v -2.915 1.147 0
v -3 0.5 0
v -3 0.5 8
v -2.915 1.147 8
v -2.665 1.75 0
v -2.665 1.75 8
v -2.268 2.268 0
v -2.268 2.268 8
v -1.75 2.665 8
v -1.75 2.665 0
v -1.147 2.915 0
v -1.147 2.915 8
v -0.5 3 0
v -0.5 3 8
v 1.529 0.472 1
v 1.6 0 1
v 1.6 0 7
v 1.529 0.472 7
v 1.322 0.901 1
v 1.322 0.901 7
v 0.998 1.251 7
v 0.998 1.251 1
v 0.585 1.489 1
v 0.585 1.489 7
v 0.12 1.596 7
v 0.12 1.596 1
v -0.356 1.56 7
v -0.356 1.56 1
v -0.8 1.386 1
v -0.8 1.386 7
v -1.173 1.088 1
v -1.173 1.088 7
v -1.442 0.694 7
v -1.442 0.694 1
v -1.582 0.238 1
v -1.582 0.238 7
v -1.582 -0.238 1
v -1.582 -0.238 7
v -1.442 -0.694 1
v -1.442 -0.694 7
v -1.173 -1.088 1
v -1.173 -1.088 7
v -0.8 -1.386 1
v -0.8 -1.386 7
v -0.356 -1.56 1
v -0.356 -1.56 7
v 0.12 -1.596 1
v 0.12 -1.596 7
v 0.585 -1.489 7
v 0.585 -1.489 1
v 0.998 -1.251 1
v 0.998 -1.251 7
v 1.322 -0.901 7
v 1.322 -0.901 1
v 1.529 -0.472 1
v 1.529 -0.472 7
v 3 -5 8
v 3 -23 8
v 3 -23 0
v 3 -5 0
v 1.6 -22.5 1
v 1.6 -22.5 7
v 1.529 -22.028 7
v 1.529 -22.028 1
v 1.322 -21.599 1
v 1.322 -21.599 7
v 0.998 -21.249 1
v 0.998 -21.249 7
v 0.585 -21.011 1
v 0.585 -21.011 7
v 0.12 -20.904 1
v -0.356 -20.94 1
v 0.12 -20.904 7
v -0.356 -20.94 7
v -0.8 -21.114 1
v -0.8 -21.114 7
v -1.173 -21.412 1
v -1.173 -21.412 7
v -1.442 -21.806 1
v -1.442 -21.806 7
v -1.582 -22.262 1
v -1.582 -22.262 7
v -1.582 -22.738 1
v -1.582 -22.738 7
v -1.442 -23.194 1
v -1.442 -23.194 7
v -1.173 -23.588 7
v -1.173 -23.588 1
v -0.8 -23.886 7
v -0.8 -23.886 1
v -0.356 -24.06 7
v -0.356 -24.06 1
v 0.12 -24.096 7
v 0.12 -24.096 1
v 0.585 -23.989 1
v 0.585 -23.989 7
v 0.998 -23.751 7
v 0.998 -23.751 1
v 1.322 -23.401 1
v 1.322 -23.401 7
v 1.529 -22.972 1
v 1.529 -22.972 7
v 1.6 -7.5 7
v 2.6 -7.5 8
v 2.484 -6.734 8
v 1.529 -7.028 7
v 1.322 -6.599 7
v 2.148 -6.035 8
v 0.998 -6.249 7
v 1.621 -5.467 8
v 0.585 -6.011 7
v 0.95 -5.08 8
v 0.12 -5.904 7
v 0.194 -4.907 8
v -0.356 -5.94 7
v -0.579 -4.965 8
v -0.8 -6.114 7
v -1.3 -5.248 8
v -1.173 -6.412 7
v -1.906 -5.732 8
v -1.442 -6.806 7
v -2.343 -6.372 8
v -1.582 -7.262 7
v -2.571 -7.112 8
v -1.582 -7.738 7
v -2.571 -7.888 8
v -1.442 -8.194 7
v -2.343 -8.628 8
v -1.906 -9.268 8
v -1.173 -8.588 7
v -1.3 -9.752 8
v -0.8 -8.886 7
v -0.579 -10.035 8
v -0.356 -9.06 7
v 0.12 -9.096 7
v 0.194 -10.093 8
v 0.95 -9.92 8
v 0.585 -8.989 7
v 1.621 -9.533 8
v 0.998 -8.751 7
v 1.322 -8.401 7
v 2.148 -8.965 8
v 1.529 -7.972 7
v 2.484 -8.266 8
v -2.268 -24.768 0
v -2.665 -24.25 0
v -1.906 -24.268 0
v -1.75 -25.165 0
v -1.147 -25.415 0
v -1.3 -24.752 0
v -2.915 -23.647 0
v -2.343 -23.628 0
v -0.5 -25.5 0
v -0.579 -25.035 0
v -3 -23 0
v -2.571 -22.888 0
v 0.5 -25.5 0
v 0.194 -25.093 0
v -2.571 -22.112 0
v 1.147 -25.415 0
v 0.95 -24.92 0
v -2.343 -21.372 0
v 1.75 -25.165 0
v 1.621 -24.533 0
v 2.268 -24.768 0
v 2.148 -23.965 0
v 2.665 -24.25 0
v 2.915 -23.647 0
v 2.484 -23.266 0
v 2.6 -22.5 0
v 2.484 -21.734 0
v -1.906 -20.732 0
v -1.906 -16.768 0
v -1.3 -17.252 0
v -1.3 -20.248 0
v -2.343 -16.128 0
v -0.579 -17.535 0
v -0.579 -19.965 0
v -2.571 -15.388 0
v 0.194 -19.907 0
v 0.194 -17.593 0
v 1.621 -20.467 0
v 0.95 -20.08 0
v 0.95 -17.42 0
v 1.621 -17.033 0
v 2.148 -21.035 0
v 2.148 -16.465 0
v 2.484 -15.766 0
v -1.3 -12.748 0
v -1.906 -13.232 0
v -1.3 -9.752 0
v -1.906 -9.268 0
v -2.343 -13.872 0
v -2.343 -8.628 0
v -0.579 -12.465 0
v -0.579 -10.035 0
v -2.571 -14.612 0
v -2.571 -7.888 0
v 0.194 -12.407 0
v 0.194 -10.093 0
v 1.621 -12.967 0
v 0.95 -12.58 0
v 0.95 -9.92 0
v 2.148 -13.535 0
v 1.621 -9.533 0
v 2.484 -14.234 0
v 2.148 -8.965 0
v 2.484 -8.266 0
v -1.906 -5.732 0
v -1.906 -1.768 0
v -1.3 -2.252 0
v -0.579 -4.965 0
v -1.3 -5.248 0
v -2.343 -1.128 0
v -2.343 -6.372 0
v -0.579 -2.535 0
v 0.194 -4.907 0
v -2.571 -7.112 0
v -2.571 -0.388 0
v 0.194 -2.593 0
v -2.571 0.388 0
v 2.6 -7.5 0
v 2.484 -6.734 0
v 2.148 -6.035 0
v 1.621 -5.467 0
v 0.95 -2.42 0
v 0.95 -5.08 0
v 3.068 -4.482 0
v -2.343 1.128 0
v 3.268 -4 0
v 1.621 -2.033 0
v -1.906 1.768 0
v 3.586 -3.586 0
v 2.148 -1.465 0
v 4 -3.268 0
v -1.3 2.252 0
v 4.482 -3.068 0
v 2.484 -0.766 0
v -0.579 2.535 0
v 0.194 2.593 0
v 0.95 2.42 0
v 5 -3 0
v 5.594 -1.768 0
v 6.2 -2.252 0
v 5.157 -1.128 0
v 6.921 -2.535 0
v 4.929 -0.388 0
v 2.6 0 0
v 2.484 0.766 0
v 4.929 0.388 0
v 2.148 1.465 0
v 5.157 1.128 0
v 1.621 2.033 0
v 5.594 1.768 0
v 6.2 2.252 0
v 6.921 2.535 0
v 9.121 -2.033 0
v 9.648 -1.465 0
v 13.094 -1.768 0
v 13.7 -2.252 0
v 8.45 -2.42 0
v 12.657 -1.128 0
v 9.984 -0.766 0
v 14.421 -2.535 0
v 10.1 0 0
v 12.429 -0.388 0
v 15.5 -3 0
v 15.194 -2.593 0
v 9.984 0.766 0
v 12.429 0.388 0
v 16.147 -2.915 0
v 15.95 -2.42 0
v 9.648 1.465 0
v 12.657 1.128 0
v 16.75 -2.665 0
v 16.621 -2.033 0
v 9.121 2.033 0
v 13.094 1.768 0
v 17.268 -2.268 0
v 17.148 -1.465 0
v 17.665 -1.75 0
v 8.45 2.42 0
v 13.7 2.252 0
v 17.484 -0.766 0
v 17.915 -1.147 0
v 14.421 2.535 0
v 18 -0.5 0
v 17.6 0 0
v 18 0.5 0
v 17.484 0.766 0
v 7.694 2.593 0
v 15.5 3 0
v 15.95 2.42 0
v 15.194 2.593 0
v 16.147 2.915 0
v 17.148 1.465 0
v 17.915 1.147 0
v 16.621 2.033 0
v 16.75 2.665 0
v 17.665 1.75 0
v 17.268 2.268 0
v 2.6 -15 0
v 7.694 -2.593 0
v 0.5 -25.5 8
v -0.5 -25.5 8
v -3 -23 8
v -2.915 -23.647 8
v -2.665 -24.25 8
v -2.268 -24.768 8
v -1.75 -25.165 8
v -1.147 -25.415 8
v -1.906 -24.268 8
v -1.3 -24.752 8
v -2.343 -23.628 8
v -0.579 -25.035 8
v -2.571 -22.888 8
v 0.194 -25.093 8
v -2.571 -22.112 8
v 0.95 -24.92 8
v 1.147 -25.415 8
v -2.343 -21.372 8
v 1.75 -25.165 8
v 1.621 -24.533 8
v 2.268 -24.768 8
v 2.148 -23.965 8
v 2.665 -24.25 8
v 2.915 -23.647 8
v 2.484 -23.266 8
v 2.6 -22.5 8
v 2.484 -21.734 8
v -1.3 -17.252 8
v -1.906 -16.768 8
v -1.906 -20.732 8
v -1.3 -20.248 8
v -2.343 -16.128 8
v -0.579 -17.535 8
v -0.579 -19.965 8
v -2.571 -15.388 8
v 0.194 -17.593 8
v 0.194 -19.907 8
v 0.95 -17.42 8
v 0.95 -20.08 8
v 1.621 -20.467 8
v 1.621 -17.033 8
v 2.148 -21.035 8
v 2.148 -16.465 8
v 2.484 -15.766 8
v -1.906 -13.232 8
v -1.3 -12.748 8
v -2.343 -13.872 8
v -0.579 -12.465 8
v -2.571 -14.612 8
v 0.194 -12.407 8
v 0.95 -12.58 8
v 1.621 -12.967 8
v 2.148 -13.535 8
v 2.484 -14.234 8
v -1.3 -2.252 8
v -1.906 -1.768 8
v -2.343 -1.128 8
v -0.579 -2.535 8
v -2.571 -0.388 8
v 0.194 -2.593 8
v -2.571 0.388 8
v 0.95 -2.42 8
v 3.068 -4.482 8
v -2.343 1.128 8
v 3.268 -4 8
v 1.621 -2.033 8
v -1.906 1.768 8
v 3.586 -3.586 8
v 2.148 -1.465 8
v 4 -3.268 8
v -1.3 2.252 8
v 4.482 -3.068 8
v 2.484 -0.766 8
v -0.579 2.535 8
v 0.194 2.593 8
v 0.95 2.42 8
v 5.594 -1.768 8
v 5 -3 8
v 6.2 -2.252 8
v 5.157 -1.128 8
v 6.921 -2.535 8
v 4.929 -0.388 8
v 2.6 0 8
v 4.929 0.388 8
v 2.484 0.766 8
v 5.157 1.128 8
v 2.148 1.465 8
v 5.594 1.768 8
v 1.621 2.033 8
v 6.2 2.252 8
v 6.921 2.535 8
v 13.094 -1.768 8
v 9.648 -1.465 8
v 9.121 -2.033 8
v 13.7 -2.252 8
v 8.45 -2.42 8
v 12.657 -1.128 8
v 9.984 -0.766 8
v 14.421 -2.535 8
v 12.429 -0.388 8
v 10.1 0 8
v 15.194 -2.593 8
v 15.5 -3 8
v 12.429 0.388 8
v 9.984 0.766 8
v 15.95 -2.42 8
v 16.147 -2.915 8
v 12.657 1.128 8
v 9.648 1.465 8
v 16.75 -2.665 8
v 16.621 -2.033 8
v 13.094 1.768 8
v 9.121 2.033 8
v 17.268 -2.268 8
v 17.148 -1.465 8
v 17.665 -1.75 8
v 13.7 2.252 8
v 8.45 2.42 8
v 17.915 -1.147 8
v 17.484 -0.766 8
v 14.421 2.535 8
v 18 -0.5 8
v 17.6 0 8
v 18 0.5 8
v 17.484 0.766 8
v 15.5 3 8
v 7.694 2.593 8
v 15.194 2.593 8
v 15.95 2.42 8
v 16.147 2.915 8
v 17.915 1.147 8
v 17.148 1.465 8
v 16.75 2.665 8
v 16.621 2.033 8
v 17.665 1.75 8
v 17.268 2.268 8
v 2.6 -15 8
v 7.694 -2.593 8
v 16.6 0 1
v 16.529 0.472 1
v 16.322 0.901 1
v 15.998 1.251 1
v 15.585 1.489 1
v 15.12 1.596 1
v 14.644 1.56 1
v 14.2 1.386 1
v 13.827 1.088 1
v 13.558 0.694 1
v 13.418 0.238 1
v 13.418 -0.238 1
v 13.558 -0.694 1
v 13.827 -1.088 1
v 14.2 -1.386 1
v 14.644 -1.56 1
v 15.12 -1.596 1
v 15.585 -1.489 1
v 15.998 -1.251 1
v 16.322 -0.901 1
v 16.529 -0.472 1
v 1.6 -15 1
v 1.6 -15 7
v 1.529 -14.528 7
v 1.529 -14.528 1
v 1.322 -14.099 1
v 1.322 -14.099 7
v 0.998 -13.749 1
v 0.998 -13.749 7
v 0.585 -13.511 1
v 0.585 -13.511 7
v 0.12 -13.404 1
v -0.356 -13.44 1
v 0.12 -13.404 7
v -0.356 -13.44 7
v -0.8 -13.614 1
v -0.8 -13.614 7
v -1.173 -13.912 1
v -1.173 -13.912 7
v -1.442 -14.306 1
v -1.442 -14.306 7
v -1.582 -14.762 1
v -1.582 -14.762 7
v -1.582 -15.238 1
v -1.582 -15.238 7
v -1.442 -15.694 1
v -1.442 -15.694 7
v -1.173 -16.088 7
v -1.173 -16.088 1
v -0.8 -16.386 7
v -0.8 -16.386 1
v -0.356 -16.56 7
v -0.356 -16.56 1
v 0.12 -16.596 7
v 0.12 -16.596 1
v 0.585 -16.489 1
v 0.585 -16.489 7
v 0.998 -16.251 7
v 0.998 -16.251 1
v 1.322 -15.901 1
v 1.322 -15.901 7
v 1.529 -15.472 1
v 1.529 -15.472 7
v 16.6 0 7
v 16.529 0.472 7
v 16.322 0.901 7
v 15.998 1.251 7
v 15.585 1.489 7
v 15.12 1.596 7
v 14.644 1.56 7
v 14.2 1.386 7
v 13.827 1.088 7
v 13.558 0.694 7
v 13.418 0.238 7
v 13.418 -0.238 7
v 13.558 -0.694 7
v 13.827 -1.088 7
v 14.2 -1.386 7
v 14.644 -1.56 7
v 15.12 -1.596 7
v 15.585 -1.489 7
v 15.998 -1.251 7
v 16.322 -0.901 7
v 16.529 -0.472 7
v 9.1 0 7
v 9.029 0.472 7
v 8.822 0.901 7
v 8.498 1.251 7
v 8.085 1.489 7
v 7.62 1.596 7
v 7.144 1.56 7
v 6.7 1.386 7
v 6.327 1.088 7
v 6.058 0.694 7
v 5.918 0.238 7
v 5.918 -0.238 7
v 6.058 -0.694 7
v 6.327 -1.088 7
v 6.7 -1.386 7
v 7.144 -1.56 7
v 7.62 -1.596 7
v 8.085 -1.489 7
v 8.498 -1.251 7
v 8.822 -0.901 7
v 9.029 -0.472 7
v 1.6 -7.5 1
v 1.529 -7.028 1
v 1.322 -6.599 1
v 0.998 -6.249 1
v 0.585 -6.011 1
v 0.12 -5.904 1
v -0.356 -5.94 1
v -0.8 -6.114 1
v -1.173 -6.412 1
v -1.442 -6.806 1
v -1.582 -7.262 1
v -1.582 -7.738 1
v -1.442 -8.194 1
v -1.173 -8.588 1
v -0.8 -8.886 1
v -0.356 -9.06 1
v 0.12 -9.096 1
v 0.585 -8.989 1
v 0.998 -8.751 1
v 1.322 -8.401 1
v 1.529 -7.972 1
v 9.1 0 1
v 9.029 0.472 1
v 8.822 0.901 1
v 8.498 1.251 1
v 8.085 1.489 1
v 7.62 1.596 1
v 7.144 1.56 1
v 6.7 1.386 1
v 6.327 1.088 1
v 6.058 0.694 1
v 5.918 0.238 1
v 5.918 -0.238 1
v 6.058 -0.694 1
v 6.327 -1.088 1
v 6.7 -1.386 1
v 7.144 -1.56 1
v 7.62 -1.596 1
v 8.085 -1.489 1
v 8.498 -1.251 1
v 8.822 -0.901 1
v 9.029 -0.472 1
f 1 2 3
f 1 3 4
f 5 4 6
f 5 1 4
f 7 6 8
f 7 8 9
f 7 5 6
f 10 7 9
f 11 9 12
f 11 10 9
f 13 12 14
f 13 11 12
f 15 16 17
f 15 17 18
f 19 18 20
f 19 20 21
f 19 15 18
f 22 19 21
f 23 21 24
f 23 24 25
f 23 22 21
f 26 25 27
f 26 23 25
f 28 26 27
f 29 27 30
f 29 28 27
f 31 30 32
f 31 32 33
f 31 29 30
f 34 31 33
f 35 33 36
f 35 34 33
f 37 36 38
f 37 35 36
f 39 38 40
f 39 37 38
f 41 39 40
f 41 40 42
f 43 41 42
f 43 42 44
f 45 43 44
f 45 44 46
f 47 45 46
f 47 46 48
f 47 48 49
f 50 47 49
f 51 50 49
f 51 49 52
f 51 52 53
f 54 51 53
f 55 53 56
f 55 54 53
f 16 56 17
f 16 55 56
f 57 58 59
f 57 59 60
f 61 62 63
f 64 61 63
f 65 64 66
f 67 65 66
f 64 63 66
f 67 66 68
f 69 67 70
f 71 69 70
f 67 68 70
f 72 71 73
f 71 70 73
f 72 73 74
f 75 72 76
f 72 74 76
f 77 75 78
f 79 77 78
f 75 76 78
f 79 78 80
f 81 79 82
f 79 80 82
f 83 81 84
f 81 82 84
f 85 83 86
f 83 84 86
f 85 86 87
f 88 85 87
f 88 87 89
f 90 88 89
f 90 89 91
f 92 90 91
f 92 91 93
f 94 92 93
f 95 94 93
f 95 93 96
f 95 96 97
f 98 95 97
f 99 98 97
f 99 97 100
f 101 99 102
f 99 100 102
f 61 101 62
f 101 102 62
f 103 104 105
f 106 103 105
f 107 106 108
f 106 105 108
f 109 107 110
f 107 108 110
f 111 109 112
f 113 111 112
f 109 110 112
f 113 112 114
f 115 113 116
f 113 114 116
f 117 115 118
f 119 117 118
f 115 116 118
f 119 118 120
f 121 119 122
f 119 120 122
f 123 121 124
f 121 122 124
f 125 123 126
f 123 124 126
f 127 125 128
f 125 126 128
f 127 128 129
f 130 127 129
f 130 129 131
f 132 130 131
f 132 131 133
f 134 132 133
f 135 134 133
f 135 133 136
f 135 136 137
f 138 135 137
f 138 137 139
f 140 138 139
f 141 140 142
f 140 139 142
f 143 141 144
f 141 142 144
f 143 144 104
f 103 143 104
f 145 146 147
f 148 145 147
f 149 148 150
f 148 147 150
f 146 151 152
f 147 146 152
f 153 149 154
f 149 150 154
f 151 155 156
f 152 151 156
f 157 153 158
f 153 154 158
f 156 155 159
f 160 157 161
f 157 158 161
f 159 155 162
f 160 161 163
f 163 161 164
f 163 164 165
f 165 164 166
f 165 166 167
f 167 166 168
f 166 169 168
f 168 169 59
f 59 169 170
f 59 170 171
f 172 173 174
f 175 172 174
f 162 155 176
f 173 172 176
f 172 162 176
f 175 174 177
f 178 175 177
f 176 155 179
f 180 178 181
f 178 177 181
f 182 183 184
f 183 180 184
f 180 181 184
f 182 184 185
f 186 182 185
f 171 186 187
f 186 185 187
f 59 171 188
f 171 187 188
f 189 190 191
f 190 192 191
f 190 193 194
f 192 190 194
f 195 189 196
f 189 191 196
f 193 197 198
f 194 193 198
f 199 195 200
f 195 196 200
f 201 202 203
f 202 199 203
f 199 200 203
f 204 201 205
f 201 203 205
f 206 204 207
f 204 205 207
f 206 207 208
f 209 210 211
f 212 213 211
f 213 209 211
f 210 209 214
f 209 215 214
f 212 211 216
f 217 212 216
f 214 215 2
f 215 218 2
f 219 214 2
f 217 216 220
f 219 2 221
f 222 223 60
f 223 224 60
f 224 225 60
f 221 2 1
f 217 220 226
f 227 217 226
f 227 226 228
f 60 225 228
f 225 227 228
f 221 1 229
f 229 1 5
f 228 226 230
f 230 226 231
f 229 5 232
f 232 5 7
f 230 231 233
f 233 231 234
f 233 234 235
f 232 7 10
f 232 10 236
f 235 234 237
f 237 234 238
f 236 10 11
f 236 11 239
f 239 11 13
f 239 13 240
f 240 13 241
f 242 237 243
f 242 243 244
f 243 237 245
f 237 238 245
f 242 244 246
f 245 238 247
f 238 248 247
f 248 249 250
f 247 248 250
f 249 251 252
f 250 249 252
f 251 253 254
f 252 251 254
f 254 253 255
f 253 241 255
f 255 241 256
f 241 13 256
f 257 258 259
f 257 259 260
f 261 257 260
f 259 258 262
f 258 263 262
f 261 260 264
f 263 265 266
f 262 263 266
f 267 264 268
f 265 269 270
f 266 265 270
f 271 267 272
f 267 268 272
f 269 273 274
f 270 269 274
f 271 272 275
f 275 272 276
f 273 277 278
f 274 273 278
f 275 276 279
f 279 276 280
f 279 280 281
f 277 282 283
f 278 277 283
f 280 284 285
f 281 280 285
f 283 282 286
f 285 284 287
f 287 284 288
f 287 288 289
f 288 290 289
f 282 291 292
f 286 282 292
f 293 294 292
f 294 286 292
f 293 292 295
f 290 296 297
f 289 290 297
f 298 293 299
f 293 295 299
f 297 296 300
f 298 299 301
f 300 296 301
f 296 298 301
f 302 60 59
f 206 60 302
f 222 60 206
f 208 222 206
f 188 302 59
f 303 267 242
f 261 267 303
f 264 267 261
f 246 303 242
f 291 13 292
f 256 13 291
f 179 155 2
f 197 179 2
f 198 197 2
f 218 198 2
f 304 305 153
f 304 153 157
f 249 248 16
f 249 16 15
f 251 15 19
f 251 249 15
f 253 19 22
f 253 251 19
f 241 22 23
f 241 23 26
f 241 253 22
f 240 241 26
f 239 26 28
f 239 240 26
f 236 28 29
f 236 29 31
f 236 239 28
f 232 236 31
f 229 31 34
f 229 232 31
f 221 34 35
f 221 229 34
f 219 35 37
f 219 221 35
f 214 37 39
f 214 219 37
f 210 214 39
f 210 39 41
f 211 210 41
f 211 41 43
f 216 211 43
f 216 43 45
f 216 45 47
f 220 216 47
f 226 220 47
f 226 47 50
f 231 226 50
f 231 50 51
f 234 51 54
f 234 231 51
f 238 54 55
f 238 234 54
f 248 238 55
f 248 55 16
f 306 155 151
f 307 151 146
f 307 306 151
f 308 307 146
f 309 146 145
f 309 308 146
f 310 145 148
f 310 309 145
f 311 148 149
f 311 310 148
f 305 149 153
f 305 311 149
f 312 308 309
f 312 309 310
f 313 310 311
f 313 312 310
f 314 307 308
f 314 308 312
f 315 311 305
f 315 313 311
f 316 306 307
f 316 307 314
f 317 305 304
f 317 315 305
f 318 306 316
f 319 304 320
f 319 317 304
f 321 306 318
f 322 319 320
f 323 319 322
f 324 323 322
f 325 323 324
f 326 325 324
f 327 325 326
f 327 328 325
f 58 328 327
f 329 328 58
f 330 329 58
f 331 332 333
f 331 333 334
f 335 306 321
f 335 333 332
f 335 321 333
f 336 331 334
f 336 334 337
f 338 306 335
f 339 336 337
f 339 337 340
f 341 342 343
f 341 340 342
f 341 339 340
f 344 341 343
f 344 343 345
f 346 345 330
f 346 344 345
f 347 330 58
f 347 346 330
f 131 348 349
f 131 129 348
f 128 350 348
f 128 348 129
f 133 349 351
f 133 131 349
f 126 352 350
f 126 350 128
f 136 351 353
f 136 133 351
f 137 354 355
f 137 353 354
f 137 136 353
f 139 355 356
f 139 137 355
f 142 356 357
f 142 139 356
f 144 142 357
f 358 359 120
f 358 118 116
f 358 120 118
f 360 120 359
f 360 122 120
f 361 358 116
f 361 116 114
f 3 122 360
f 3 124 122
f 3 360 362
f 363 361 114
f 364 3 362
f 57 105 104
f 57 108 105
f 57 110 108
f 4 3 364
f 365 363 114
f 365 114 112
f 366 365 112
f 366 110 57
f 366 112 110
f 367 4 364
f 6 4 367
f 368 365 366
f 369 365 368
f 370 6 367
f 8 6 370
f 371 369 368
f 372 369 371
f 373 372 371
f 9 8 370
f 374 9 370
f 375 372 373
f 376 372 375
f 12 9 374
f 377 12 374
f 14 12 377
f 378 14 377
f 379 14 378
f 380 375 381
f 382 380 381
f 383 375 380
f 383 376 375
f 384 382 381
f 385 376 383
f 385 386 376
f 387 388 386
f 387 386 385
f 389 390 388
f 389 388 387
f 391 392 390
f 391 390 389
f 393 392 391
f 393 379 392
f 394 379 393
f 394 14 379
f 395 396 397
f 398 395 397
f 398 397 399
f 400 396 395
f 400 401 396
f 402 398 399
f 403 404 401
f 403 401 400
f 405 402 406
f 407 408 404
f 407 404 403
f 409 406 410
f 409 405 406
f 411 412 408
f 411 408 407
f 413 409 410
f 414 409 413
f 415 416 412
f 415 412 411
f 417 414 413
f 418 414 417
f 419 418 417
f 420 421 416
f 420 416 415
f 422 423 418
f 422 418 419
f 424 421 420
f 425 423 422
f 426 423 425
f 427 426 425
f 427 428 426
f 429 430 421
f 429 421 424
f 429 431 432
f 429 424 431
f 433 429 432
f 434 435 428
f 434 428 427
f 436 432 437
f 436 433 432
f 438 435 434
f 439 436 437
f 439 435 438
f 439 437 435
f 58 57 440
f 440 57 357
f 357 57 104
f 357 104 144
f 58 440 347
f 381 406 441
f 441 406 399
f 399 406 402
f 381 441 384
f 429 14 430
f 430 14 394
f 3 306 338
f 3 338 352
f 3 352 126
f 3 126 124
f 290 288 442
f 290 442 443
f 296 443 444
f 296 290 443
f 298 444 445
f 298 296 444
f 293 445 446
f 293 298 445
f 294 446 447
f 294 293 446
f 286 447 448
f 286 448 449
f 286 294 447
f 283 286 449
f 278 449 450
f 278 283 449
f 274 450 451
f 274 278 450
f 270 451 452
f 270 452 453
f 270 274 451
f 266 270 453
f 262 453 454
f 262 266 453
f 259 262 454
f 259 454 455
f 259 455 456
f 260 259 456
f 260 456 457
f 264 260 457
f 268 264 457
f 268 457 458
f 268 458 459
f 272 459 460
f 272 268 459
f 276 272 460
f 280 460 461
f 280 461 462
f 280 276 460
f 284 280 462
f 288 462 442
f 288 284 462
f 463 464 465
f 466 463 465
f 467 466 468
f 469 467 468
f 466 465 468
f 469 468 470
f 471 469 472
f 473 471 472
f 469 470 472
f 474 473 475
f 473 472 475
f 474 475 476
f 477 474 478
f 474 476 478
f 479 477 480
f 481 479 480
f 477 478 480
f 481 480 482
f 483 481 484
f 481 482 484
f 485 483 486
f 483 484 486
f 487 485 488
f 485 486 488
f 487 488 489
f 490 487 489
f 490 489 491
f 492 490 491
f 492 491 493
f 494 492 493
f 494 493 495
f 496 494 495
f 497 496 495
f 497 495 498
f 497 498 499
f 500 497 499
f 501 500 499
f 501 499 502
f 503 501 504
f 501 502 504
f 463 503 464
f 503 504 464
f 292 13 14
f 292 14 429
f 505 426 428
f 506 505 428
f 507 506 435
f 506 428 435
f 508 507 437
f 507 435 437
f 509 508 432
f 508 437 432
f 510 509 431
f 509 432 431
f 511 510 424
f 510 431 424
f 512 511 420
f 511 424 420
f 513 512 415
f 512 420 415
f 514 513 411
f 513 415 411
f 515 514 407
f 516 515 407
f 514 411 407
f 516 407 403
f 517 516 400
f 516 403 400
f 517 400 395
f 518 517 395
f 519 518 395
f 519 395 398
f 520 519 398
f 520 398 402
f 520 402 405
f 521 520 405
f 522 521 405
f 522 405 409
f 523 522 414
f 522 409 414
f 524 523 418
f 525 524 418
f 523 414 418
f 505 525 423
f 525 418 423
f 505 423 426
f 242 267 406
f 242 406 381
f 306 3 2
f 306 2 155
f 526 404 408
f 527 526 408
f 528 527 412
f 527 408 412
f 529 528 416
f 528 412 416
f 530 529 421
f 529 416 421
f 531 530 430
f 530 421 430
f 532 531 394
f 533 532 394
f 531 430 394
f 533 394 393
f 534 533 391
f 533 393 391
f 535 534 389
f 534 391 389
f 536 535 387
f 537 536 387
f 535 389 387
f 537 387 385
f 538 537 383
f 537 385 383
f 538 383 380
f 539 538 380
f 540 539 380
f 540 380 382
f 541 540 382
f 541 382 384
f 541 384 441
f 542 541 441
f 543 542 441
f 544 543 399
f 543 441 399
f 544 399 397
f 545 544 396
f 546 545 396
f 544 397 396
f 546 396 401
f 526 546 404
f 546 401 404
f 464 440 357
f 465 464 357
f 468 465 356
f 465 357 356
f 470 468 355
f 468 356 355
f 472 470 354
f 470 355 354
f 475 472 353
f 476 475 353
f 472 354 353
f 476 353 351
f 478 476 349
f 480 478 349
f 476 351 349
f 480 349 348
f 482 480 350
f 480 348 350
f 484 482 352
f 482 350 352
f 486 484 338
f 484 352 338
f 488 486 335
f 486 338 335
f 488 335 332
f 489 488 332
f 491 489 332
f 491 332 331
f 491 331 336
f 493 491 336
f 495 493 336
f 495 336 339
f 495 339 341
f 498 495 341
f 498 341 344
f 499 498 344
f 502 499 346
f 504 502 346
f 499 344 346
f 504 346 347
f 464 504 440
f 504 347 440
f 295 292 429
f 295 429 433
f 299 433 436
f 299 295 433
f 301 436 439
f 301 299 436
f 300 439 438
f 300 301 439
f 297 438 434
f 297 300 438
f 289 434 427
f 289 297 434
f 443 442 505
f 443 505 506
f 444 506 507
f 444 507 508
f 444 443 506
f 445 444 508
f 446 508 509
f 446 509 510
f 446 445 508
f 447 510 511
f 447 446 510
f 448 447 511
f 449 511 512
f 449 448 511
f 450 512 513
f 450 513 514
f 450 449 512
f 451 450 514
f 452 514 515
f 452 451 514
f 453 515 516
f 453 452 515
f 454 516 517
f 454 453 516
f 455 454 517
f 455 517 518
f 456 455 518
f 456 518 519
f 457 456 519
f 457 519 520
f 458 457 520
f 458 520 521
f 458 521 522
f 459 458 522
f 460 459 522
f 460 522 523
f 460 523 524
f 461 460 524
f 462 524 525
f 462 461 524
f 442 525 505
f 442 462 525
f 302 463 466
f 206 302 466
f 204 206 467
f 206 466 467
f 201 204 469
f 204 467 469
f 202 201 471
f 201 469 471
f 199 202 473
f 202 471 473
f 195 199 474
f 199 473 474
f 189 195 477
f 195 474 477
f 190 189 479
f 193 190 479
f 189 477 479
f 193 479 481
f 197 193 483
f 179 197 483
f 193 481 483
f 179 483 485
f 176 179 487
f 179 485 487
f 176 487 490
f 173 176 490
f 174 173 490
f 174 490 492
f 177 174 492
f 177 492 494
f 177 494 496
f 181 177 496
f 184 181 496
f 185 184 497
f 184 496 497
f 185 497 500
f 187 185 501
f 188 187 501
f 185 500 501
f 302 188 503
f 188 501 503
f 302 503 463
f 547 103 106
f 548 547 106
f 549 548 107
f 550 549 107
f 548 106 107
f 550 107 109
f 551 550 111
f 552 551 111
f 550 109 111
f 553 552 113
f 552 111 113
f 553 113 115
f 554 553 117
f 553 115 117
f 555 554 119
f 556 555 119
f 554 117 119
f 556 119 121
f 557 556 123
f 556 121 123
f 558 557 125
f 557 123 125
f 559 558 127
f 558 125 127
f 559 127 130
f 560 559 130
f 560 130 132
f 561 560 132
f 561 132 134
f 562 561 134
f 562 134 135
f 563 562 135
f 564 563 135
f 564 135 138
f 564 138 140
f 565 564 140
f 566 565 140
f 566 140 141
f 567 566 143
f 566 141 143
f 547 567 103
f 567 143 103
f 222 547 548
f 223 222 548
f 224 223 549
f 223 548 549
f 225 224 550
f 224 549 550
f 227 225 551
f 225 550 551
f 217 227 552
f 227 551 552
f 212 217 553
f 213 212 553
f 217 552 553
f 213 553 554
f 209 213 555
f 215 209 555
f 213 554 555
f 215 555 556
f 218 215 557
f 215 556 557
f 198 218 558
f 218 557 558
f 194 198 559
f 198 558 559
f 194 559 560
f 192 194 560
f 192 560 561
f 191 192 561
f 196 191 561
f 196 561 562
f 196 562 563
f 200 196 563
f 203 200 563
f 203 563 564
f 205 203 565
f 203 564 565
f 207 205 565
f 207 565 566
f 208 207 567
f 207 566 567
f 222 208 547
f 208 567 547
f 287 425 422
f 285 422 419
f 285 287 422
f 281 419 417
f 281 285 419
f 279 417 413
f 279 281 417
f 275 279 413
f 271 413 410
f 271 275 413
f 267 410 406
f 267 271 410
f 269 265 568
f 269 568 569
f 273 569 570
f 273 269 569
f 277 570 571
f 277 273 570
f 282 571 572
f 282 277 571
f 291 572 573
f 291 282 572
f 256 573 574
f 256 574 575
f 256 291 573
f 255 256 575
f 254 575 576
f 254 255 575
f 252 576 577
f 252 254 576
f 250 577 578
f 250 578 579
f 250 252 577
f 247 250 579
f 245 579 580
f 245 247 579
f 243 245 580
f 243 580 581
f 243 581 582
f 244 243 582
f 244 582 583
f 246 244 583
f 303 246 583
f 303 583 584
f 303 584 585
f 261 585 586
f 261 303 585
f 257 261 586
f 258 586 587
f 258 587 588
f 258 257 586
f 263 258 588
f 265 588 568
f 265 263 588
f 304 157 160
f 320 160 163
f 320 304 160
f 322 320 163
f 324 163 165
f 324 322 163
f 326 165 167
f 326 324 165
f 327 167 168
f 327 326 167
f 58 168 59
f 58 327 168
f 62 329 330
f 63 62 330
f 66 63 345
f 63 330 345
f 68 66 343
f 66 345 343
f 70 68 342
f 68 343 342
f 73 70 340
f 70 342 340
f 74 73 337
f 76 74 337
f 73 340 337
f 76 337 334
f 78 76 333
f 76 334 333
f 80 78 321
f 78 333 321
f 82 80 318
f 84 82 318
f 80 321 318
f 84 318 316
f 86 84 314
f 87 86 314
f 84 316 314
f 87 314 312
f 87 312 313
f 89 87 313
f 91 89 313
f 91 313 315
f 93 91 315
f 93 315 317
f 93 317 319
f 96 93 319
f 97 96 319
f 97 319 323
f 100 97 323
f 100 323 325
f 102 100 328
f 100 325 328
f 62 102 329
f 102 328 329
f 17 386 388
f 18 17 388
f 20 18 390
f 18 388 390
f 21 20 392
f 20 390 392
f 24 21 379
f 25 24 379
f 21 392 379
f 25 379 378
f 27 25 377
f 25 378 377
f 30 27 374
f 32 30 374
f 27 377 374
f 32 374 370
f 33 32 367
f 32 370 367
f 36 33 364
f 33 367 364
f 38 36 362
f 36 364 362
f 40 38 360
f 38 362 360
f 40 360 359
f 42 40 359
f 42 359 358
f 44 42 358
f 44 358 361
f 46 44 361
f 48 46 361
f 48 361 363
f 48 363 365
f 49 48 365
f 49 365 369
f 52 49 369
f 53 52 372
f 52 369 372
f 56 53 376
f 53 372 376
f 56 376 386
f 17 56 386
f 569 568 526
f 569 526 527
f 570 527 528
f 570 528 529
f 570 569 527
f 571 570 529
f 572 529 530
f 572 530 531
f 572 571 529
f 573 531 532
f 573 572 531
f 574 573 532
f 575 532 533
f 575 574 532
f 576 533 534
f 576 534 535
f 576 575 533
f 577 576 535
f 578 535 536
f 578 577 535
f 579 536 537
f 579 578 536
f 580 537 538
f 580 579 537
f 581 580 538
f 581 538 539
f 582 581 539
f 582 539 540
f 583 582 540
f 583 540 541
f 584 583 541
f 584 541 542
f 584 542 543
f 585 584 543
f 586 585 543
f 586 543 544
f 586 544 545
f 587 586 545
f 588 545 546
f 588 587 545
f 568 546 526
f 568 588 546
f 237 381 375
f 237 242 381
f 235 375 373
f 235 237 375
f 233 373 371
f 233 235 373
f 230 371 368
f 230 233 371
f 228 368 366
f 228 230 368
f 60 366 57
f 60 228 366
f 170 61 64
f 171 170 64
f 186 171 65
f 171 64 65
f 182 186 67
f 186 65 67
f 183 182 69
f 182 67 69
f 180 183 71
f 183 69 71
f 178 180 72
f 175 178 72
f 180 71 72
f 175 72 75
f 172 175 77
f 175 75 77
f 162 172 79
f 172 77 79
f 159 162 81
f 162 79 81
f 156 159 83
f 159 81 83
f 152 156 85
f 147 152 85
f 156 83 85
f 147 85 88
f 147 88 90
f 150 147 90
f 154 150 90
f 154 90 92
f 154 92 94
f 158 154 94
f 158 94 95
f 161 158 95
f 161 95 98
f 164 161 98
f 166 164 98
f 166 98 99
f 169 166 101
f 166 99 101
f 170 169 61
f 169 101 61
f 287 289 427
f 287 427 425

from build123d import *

# Parameters (mm, degrees)
SKETCH1_R           = 1.6
BOSS_EXTRUDE1_DEPTH = 8
CHAMFER1_SIZE       = 1
SKETCH2_R           = 1.6
BOSS_EXTRUDE3_DEPTH = 8
FILLET1_R           = 2
CHAMFER5_SIZE       = 1


with BuildPart() as part:
    # Sketch1 → Boss-Extrude1 (new body)
    with BuildSketch(Plane.XY):
        with BuildLine():
            Line((-0.5, 3), (15.5, 3))
            ThreePointArc((15.5, 3), (17.267766953, 2.267766953), (18, 0.5))
            Line((18, 0.5), (18, -0.5))
            ThreePointArc((18, -0.5), (17.267766953, -2.267766953), (15.5, -3))
            Line((15.5, -3), (-0.5, -3))
            ThreePointArc((-0.5, -3), (-2.267766953, -2.267766953), (-3, -0.5))
            Line((-3, -0.5), (-3, 0.5))
            ThreePointArc((-3, 0.5), (-2.267766953, 2.267766953), (-0.5, 3))
        make_face()
        Circle(SKETCH1_R, mode=Mode.SUBTRACT)
        with Locations((7.5, 0)):
            Circle(SKETCH1_R, mode=Mode.SUBTRACT)
        with Locations((15, 0)):
            Circle(SKETCH1_R, mode=Mode.SUBTRACT)
    extrude(amount=BOSS_EXTRUDE1_DEPTH)

    # Chamfer1
    chamfer1_edges = [part.edges().sort_by_distance(p)[0] for p in [
        (-1.6, 0, 0),
        (-1.6, 0, 8),
        (5.9, 0, 0),
        (5.9, 0, 8),
        (13.4, 0, 0),
        (13.4, 0, 8),
    ]]
    chamfer(chamfer1_edges, length=CHAMFER1_SIZE)

    # Sketch2 → Boss-Extrude3 (add)
    with BuildSketch(Plane.XY.offset(8)):
        with BuildLine():
            ThreePointArc((-0.5, -3), (-2.267766953, -2.267766953), (-3, -0.5))
            Line((-3, -0.5), (-3, -23))
            ThreePointArc((-3, -23), (-2.267766953, -24.767766953), (-0.5, -25.5))
            Line((-0.5, -25.5), (0.5, -25.5))
            ThreePointArc((0.5, -25.5), (2.267766953, -24.767766953), (3, -23))
            Line((3, -23), (3, -3))
            Line((3, -3), (-0.5, -3))
        make_face()
        with Locations((0, -22.5)):
            Circle(SKETCH2_R, mode=Mode.SUBTRACT)
        with Locations((0, -15)):
            Circle(SKETCH2_R, mode=Mode.SUBTRACT)
        with Locations((0, -7.5)):
            Circle(SKETCH2_R, mode=Mode.SUBTRACT)
    extrude(amount=-BOSS_EXTRUDE3_DEPTH)

    # Fillet1
    fillet1_edges = [part.edges().sort_by_distance(p)[0] for p in [
        (3, -3, 4),
    ]]
    fillet(fillet1_edges, radius=FILLET1_R)

    # Chamfer5
    chamfer5_edges = [part.edges().sort_by_distance(p)[0] for p in [
        (-1.6, -7.5, 8),
        (-1.6, -15, 8),
        (-1.6, -22.5, 8),
        (-1.6, -22.5, 0),
        (-1.6, -15, 0),
        (-1.6, -7.5, 0),
    ]]
    chamfer(chamfer5_edges, length=CHAMFER5_SIZE)


solid = part.part
